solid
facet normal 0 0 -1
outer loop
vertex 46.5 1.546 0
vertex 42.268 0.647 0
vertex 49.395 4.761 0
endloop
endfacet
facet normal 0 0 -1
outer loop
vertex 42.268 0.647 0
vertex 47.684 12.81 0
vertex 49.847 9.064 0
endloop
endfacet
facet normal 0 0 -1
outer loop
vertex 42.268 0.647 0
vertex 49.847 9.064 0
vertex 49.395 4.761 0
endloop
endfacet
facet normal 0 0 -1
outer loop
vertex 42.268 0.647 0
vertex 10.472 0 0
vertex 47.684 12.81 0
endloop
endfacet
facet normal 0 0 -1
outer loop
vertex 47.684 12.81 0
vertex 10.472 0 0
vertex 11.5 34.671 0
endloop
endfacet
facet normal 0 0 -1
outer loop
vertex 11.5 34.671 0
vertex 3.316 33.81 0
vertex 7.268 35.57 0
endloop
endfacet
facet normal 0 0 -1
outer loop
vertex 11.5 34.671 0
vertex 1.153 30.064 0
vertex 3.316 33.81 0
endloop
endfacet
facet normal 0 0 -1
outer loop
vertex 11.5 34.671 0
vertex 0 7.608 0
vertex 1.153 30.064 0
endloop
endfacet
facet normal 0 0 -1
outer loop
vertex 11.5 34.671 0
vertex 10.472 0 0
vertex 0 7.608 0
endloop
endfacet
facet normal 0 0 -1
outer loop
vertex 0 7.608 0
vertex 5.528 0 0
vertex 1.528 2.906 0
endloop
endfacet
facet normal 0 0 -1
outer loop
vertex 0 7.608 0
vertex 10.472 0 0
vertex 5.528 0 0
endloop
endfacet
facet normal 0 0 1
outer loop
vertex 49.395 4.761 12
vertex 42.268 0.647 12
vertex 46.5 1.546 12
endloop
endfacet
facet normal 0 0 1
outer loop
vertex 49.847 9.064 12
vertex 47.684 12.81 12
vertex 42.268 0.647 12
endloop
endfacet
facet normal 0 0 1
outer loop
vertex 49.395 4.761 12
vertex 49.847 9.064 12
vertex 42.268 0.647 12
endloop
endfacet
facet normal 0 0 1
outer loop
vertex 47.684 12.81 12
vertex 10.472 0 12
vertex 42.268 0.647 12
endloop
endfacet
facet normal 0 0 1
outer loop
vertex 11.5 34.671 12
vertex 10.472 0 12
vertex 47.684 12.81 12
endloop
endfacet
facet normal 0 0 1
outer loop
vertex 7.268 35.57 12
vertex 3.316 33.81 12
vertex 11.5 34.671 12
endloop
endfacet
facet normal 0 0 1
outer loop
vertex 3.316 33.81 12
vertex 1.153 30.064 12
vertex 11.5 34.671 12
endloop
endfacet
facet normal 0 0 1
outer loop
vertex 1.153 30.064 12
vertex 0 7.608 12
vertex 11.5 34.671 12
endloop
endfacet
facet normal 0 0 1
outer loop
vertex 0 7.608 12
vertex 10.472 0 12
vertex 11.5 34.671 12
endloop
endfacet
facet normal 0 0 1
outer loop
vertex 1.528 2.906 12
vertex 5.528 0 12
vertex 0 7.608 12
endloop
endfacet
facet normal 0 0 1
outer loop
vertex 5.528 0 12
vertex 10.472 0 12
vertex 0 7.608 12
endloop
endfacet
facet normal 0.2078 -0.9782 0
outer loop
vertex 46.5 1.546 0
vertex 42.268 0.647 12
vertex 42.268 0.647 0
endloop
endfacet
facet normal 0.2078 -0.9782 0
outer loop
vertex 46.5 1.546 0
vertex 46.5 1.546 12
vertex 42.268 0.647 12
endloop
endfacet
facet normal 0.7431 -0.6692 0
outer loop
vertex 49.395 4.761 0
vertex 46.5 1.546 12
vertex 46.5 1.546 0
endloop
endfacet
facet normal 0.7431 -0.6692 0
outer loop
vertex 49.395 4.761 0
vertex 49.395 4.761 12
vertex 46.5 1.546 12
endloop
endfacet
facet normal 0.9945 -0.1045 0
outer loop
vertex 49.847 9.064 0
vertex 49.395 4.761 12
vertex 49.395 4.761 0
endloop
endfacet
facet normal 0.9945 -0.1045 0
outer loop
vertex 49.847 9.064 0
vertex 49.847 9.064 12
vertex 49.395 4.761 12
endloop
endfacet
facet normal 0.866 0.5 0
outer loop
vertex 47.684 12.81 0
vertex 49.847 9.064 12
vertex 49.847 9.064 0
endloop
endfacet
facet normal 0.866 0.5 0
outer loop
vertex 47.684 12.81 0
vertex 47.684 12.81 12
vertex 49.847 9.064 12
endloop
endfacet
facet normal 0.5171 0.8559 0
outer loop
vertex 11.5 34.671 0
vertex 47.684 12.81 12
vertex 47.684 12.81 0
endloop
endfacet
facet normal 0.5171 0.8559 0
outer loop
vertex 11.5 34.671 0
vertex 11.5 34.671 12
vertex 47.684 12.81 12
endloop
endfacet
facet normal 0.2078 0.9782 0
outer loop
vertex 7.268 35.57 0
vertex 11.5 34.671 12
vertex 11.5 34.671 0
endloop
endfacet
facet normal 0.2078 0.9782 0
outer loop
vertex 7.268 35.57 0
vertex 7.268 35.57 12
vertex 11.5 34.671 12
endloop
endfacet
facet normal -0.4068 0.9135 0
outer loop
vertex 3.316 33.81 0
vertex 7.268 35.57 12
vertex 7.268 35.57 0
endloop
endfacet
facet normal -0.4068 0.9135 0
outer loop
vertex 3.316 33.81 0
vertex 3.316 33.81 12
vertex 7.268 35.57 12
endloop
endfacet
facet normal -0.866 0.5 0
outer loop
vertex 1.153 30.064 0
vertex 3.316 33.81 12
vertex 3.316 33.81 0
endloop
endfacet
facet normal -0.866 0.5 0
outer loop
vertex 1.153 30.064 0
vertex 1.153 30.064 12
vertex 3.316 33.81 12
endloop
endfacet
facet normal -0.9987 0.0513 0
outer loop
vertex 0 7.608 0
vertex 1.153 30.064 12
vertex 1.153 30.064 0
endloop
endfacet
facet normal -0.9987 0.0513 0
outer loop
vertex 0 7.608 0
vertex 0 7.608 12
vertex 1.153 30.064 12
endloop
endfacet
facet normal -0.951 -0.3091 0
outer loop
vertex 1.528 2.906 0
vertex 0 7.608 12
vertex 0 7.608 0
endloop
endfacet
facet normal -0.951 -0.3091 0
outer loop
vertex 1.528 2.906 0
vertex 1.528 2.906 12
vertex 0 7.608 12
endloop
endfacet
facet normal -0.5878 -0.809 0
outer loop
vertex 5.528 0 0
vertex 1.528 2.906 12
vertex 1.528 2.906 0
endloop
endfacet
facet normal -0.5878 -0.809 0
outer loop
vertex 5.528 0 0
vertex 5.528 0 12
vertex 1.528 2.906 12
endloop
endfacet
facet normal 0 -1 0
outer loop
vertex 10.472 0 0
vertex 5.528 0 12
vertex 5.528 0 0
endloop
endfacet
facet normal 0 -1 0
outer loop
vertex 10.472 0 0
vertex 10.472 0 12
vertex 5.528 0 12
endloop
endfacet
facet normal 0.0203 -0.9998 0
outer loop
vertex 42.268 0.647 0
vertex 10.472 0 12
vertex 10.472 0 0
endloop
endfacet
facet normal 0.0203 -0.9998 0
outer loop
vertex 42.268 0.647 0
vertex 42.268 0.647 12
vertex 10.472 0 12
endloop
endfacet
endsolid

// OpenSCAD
$fn = 32;

// ----------------------------------------------------------------------
// Lever arm: two bosses 16 and 14 mm, 35 mm between centres
// ----------------------------------------------------------------------

// --- parameters (mm) ---
profile_height = 12;      // extrusion height
profile_points = 13;      // points of the closed outline

profile = [[0, 7.608], [1.528, 2.906], [5.528, 0], [10.472, 0], [42.268, 0.647], [46.5, 1.546], [49.395, 4.761], [49.847, 9.064], [47.684, 12.81], [11.5, 34.671], [7.268, 35.57], [3.316, 33.81], [1.153, 30.064]];  // single closed polygon, 13 points, counter clockwise

// --- the one profile operation ---
linear_extrude(height = profile_height) polygon(points = profile);
